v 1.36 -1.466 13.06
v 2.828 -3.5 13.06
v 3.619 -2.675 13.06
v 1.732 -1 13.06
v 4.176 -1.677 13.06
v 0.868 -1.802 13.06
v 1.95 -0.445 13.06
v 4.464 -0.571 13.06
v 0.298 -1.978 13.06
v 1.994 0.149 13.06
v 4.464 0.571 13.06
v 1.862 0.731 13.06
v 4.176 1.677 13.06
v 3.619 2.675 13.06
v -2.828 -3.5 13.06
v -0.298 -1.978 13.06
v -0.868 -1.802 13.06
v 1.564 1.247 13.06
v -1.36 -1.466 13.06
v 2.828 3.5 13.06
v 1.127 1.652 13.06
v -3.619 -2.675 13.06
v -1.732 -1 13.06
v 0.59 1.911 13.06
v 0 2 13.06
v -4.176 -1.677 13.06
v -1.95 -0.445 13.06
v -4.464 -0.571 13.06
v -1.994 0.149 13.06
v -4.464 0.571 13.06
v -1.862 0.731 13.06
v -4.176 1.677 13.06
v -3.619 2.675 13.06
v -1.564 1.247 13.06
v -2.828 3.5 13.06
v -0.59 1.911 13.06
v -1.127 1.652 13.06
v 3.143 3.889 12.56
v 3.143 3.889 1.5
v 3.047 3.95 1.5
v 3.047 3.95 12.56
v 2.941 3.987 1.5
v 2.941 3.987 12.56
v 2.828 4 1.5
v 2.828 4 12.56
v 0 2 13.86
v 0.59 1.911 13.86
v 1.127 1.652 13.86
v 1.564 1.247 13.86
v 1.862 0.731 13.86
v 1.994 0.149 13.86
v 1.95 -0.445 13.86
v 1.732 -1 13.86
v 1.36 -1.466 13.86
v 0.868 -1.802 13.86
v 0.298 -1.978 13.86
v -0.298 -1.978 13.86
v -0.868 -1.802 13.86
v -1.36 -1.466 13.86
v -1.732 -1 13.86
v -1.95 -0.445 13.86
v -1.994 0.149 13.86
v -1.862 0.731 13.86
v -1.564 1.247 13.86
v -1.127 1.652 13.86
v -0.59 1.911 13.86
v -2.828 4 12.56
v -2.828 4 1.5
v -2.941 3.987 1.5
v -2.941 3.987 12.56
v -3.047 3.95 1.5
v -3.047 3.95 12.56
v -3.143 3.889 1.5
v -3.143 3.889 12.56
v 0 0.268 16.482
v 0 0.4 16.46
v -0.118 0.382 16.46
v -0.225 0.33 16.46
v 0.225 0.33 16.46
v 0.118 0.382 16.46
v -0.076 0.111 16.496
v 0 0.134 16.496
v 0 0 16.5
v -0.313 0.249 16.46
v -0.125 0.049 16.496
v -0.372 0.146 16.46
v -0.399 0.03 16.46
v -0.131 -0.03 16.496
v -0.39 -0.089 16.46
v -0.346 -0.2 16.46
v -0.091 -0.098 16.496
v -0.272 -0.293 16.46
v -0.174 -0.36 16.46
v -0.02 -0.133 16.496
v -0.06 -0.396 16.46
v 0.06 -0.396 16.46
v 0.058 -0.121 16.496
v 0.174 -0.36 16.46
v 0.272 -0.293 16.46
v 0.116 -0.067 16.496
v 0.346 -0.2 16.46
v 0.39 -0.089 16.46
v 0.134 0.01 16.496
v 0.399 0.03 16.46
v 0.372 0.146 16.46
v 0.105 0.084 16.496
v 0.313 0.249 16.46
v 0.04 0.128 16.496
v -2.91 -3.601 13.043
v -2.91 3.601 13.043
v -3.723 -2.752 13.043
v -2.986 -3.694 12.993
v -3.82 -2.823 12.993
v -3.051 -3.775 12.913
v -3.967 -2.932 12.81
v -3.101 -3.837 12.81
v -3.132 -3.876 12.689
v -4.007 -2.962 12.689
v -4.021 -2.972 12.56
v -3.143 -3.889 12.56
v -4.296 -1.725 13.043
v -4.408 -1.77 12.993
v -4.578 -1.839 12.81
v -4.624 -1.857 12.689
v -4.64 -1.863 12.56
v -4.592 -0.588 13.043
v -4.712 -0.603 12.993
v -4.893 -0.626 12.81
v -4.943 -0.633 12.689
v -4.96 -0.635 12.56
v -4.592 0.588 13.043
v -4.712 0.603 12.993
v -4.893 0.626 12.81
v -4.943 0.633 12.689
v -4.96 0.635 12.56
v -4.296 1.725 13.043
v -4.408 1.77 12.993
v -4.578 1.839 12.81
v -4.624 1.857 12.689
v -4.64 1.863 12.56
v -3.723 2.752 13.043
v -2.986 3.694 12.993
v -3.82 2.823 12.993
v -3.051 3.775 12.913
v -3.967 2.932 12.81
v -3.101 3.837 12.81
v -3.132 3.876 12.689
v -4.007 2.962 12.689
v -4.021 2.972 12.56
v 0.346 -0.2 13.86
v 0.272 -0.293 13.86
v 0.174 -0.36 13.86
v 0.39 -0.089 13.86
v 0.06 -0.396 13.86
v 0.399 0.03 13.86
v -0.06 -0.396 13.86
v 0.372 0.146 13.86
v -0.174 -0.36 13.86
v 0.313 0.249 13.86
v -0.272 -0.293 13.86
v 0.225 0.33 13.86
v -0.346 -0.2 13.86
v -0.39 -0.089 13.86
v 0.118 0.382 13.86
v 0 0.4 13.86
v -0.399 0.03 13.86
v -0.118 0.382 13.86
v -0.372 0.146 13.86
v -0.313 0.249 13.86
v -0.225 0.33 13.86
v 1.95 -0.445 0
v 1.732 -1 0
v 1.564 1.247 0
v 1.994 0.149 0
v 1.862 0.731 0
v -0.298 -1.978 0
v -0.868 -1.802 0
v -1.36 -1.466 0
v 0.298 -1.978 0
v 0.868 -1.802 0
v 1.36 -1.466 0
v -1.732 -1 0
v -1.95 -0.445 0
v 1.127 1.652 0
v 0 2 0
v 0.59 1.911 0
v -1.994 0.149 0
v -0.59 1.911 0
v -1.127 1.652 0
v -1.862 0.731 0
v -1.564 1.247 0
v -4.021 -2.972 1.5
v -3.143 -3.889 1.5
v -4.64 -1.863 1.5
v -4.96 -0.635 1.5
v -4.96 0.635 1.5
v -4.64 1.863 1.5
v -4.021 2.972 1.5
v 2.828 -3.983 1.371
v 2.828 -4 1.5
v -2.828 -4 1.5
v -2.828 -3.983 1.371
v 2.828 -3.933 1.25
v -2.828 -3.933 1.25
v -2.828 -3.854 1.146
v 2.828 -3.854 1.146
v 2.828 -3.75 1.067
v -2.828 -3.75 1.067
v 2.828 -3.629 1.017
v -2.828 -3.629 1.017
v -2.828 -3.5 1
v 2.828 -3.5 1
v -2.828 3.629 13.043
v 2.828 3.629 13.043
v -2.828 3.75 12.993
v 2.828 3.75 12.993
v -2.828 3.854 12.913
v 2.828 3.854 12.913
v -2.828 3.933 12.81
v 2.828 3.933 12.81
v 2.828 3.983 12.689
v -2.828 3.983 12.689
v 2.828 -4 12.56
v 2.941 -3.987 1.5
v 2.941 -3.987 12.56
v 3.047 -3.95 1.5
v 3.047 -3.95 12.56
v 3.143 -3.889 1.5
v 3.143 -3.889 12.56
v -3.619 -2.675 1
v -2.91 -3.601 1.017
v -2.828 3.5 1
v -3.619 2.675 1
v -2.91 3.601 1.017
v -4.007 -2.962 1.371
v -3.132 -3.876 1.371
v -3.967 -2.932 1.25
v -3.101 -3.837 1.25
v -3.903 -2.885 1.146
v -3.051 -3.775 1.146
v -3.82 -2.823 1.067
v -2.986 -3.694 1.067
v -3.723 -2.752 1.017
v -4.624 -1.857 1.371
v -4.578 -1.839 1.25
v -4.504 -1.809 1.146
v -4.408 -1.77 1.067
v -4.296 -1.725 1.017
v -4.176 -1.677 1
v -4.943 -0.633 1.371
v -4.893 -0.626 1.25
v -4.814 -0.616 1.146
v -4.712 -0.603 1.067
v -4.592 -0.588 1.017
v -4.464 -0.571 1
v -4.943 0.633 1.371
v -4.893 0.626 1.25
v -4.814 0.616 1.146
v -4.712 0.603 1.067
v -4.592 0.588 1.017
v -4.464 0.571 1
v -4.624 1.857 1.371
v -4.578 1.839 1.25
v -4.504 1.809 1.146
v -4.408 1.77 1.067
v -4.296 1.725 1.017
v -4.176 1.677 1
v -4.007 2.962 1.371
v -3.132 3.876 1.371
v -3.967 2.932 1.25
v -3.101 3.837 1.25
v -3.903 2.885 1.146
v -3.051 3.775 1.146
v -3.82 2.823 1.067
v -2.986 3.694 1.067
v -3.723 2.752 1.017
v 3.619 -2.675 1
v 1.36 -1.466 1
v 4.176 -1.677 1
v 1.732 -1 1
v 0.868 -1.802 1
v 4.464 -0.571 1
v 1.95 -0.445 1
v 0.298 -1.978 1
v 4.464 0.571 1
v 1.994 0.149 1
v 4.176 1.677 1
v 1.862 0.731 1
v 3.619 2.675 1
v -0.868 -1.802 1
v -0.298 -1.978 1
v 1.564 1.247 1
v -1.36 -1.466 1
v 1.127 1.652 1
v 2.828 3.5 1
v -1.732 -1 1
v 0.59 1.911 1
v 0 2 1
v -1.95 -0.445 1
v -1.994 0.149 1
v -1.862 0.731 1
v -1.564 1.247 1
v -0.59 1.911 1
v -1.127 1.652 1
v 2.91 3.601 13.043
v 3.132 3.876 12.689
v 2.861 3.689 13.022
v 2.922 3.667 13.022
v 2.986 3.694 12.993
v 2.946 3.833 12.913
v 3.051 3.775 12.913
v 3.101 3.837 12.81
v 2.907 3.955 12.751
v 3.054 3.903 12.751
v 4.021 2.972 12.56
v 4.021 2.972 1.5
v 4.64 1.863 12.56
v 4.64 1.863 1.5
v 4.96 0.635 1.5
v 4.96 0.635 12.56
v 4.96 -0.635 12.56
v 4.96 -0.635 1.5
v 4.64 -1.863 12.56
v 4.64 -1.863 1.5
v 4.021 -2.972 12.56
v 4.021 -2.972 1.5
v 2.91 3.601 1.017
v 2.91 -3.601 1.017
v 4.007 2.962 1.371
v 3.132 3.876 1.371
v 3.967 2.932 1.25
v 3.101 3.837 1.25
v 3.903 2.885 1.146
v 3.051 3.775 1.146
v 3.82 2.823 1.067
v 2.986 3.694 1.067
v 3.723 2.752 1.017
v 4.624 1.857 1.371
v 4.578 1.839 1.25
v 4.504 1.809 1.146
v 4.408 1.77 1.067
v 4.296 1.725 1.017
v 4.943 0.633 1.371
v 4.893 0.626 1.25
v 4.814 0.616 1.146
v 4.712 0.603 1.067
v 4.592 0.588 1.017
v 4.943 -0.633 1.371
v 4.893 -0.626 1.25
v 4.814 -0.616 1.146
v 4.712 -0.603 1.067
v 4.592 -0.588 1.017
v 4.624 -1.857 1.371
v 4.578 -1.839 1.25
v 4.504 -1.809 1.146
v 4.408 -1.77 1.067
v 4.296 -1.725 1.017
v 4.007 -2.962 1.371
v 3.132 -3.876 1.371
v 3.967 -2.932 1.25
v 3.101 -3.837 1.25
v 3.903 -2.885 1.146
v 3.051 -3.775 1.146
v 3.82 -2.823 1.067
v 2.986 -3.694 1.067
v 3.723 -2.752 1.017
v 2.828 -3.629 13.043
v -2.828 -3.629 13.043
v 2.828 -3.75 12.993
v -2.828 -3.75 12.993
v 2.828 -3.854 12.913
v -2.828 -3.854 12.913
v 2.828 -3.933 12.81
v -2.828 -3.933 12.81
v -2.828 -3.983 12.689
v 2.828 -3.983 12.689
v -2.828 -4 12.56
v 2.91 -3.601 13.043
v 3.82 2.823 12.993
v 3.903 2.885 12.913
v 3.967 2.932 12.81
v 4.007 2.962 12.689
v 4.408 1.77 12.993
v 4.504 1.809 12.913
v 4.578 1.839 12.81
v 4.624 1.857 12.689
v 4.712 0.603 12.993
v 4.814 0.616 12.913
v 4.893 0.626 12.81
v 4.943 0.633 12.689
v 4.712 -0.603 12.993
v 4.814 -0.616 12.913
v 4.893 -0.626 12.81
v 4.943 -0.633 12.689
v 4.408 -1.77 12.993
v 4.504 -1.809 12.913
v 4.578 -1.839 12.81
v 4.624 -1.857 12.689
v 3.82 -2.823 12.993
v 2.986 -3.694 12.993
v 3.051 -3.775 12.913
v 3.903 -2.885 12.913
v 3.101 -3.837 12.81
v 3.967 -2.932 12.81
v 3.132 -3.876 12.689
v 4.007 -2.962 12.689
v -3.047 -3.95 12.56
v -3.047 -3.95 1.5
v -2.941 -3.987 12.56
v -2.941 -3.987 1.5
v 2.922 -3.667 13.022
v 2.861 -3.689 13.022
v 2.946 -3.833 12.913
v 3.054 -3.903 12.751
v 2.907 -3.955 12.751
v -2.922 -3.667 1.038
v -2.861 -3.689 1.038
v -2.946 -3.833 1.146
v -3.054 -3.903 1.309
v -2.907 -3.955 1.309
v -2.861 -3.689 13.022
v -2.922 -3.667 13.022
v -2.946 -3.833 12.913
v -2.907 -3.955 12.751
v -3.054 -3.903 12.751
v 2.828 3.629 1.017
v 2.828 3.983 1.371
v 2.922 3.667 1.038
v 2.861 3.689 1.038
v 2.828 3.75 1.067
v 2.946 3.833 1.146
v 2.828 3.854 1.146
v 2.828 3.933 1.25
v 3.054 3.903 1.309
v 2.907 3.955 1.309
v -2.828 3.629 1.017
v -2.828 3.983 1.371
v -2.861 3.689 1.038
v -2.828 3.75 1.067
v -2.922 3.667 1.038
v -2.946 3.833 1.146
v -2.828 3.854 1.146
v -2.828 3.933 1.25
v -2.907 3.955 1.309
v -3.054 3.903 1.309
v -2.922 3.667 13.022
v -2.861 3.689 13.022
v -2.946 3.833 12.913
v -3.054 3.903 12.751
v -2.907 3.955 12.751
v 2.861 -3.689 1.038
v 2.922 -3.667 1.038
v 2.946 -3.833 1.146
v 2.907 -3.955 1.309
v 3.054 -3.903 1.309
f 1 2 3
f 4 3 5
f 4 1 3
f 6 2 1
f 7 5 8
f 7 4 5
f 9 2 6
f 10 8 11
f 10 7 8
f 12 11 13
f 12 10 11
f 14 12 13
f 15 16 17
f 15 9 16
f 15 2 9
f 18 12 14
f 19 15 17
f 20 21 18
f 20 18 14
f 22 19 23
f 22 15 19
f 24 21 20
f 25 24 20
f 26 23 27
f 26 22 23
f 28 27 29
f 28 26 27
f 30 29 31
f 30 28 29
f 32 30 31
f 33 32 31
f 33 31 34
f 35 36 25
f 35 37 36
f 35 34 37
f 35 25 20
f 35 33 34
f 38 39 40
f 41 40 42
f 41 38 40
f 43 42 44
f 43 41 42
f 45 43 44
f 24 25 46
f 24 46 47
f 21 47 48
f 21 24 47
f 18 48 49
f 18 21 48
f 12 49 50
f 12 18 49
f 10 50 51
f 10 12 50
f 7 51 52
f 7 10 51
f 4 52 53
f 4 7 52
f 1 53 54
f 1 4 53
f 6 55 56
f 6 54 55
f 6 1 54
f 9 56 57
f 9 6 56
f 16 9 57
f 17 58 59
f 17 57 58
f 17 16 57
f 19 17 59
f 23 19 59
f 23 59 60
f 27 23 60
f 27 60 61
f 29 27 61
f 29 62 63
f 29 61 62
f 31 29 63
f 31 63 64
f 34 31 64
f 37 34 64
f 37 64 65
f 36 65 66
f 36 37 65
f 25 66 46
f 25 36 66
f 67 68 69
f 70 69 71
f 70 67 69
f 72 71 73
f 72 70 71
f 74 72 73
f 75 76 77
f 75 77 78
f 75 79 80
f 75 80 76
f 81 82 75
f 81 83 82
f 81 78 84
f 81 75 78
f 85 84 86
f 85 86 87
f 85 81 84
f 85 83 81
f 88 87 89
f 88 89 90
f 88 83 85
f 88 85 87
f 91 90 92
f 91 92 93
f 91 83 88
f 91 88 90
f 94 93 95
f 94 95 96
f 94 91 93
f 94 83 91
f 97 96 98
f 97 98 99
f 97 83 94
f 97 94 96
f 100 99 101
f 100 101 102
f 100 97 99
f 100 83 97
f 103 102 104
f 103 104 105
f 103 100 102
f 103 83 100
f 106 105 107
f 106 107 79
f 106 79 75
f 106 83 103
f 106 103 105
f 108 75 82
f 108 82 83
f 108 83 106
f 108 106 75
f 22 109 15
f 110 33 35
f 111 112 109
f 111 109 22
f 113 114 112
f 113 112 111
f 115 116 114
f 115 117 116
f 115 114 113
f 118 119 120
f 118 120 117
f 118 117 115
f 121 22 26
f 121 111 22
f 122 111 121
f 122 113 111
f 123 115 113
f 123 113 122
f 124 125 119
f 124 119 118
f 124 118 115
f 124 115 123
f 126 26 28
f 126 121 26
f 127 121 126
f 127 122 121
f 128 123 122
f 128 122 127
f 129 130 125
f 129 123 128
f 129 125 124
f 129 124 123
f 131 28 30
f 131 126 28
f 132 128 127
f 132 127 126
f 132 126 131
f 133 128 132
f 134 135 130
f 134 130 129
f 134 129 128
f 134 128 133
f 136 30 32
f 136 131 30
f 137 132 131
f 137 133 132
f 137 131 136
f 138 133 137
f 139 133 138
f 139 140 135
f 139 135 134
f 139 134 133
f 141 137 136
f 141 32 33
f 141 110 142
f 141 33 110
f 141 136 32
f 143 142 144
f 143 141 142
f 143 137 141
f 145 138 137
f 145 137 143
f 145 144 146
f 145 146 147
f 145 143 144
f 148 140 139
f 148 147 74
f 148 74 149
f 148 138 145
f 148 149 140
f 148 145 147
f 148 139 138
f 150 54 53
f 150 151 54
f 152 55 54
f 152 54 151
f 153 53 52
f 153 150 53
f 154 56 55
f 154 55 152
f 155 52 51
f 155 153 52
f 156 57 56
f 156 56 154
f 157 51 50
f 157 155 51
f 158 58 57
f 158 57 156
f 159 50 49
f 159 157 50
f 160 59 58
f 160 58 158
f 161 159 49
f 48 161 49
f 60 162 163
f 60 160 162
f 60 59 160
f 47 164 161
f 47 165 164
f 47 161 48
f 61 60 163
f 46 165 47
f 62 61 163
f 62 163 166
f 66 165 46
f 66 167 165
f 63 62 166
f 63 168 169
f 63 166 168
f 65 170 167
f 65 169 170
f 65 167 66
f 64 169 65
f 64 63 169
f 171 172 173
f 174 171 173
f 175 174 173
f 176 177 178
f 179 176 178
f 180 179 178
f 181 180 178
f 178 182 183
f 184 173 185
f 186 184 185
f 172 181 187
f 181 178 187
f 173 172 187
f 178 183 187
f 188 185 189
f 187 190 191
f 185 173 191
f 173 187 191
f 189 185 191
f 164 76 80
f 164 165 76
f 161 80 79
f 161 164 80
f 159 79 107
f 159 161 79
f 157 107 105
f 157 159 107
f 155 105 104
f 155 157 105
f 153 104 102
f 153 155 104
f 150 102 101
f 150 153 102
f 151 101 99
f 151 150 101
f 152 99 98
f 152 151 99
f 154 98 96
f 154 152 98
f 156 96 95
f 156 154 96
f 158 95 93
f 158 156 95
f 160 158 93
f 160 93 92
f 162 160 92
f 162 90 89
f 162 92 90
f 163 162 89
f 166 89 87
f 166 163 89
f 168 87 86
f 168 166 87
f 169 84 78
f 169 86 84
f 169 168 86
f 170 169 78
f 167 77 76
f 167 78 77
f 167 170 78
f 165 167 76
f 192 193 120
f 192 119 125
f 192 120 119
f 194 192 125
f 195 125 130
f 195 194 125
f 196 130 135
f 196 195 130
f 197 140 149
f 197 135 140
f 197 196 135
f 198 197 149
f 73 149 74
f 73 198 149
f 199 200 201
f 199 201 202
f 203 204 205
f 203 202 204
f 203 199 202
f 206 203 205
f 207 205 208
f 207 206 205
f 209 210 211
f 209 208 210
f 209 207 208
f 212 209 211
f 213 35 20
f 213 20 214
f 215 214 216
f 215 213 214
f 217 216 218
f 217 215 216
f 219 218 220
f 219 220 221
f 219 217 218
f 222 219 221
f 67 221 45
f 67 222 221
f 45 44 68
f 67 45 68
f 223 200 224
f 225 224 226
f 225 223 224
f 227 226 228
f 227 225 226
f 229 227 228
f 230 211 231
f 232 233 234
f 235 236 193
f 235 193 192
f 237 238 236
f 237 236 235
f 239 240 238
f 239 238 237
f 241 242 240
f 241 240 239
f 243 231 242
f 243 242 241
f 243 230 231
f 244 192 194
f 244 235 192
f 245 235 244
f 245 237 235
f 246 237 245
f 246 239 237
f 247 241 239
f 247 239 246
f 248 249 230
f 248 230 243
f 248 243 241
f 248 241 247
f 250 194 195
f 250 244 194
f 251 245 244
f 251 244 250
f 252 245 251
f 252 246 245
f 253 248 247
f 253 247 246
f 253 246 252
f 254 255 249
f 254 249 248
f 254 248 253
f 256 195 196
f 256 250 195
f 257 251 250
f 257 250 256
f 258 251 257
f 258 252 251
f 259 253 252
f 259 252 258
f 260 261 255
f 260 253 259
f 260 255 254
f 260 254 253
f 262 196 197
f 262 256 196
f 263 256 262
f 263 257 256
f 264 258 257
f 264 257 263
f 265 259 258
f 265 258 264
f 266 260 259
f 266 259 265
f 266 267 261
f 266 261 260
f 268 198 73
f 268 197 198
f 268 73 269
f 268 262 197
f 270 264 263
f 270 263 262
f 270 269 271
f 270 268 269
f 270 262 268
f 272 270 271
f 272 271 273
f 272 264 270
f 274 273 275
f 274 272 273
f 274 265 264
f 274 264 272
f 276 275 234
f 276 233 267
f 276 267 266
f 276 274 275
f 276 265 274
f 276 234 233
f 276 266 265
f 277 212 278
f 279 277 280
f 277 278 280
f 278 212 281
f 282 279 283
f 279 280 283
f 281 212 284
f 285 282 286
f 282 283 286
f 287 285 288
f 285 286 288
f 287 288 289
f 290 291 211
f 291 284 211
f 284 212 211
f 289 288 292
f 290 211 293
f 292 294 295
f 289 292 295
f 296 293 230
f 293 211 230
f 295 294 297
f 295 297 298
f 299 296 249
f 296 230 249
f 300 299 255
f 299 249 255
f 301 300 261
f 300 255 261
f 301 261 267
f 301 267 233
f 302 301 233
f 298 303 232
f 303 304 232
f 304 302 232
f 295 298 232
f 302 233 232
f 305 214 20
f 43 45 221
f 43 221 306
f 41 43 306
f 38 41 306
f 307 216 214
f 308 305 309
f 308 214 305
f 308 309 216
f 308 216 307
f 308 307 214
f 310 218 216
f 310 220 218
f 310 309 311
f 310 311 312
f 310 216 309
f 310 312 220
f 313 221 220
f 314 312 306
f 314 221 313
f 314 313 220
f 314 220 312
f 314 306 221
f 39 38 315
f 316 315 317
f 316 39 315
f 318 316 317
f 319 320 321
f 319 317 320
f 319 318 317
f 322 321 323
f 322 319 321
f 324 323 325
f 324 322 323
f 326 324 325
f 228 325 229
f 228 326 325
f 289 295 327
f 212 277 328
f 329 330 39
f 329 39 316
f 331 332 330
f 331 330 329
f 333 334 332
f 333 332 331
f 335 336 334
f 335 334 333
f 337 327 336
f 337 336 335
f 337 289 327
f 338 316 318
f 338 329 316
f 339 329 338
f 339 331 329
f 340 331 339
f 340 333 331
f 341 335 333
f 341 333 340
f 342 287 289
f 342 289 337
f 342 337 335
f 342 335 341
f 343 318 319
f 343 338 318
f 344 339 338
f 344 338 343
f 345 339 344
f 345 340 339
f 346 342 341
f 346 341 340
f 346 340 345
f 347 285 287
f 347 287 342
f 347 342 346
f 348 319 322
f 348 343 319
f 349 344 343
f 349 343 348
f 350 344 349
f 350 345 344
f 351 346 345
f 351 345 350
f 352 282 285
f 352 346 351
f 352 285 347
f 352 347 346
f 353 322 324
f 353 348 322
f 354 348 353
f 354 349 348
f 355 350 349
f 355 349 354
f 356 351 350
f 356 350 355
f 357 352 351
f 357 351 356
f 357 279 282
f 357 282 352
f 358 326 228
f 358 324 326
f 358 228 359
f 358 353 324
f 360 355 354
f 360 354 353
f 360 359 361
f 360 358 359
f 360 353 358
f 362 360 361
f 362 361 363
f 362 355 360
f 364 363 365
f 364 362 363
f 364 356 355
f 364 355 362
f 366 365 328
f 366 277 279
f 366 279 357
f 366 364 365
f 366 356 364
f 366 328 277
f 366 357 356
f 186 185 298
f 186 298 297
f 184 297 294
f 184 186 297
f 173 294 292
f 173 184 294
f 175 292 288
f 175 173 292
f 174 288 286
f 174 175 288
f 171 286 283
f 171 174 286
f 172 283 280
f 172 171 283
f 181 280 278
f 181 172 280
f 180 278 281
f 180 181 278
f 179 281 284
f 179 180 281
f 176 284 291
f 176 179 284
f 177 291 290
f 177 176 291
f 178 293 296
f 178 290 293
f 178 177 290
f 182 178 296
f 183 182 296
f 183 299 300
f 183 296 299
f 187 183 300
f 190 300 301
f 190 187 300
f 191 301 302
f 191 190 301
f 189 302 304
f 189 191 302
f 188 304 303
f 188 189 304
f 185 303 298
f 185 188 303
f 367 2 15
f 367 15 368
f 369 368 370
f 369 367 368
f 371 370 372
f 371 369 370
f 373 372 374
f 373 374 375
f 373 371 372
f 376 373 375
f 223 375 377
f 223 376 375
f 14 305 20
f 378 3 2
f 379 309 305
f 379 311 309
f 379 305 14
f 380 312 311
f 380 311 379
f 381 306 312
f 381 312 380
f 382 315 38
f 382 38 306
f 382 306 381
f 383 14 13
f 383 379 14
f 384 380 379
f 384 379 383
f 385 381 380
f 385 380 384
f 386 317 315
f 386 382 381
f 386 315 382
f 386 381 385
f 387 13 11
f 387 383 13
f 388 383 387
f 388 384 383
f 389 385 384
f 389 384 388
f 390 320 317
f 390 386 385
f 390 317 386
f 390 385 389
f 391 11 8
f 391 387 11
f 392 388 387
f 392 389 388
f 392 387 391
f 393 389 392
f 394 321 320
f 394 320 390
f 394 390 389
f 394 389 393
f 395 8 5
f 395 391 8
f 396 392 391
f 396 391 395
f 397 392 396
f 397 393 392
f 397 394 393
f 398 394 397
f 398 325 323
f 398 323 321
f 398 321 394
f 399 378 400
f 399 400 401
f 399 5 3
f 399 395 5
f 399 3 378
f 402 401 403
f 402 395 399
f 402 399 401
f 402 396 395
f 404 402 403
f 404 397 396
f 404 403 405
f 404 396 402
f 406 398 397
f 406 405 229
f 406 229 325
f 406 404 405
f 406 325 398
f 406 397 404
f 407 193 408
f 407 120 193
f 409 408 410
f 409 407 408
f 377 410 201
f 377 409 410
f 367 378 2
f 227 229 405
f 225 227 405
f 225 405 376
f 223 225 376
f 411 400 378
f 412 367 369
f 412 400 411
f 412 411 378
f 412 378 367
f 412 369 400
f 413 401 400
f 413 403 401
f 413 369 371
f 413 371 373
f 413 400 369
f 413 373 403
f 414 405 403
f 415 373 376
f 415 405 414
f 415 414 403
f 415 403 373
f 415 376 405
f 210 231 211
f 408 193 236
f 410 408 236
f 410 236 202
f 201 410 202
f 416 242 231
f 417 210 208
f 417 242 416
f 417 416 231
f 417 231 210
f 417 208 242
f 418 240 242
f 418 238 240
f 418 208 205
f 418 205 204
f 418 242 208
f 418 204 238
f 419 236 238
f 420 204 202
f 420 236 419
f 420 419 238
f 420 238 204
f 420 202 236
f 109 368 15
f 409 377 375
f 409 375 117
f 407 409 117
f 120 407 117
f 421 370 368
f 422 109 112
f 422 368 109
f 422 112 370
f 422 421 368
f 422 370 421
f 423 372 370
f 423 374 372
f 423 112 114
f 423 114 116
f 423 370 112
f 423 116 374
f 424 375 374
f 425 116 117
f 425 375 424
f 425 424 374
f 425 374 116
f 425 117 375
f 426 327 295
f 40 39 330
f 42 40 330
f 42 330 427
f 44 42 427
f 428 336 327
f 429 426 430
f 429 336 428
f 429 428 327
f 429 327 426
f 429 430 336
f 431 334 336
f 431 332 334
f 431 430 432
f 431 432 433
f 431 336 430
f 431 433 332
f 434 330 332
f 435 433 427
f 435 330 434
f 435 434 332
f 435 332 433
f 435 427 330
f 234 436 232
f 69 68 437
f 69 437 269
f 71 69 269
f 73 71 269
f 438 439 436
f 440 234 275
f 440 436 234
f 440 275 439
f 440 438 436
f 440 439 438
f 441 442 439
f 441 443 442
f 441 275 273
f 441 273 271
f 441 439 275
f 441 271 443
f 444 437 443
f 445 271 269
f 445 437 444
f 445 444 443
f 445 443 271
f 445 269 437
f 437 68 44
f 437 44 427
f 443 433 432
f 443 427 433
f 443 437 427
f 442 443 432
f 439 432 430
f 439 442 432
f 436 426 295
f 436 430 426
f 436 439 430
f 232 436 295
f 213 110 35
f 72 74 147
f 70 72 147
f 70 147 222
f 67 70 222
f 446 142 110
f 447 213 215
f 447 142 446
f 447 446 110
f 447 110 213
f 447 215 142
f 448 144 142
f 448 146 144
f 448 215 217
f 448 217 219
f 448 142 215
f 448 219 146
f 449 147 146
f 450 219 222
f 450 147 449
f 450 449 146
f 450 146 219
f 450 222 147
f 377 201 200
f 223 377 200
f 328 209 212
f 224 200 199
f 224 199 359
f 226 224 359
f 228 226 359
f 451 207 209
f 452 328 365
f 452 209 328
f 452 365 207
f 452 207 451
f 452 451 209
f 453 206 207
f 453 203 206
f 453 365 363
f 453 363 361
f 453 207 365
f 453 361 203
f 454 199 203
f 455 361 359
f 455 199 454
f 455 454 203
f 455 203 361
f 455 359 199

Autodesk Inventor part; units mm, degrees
ref_plane "YZ Plane" through (0, 0, 0) normal (1, 0, 0) x (0, 1, 0)
ref_plane "XZ Plane" through (0, 0, 0) normal (0, 1, 0) x (-1, 0, 0)
ref_plane "XY Plane" through (0, 0, 0) normal (0, 0, 1) x (1, 0, 0)
sketch "Эскиз1" plane through (0, 0, 0) normal (1, 0, 0) x (0, 1, 0)
  line L0 (0.4, 16.4596) -> (0.4, 13.8596)
  line L1 (0.4, 13.8596) -> (2, 13.8596)
  line L2 (2, 13.8596) -> (2, 13.0596)
  line L3 (2, 13.0596) -> (5, 13.0596)
  line L4 (5, 13.0596) -> (5, 1)
  line L5 (5, 1) -> (2, 1)
  line L6 (2, 1) -> (2, 0)
  line L7 (2, 0) -> (0, 0)
  line L8 (0, 0) -> (0, 16.5)
  line L9 (0, -3.302) -> (0, 19.8121) projected
  arc A0 (0.4, 16.4596) -> (0, 16.5) centre (0, 14.5) ccw
  dimension "d0" = 16.5
  dimension "d1" = 0.8
  dimension "d2" = 2.6
  dimension "d3" = 0.8
  dimension "d4" = 10
  dimension "d5" = 4
  dimension "d6" = 1
  dimension "d7" = 4
  dimension "d13" = 2
revolve "Вращение1" add sketch "Эскиз1" angle 360 about axis through (0, 0, -10) along (0, 0, 1)
sketch "Эскиз2" plane through (0, 0, 1) normal (0, 0, -1) x (-1, 0, 0)
  circle A0 centre (0, 0) radius 5 projected
  line L0 (-3, 4) -> (3, 4)
  line L1 (3, -4) -> (-3, -4)
  line L2 (7, 0) -> (-7, 0) projected
  dimension "d9" = 8
extrude "Выдавливание1" cut sketch "Эскиз2" against normal blind 13.25 contours L0 A0 | A0 L1
fillet "Сопряжение1" radius 0.5 12 edges at (0, 4, 13.0596) (5, 0, 13.0596) (-5, 0, 13.0596) (0, -4, 13.0596) (3, -4, 7.0298) (-3, -4, 7.0298) (-3, 4, 7.0298) (3, 4, 7.0298) (0, -4, 1) (5, 0, 1) (-5, 0, 1) (0, 4, 1)
properties part number "Моторчик" material "Латунь, мягкая, желтая"
